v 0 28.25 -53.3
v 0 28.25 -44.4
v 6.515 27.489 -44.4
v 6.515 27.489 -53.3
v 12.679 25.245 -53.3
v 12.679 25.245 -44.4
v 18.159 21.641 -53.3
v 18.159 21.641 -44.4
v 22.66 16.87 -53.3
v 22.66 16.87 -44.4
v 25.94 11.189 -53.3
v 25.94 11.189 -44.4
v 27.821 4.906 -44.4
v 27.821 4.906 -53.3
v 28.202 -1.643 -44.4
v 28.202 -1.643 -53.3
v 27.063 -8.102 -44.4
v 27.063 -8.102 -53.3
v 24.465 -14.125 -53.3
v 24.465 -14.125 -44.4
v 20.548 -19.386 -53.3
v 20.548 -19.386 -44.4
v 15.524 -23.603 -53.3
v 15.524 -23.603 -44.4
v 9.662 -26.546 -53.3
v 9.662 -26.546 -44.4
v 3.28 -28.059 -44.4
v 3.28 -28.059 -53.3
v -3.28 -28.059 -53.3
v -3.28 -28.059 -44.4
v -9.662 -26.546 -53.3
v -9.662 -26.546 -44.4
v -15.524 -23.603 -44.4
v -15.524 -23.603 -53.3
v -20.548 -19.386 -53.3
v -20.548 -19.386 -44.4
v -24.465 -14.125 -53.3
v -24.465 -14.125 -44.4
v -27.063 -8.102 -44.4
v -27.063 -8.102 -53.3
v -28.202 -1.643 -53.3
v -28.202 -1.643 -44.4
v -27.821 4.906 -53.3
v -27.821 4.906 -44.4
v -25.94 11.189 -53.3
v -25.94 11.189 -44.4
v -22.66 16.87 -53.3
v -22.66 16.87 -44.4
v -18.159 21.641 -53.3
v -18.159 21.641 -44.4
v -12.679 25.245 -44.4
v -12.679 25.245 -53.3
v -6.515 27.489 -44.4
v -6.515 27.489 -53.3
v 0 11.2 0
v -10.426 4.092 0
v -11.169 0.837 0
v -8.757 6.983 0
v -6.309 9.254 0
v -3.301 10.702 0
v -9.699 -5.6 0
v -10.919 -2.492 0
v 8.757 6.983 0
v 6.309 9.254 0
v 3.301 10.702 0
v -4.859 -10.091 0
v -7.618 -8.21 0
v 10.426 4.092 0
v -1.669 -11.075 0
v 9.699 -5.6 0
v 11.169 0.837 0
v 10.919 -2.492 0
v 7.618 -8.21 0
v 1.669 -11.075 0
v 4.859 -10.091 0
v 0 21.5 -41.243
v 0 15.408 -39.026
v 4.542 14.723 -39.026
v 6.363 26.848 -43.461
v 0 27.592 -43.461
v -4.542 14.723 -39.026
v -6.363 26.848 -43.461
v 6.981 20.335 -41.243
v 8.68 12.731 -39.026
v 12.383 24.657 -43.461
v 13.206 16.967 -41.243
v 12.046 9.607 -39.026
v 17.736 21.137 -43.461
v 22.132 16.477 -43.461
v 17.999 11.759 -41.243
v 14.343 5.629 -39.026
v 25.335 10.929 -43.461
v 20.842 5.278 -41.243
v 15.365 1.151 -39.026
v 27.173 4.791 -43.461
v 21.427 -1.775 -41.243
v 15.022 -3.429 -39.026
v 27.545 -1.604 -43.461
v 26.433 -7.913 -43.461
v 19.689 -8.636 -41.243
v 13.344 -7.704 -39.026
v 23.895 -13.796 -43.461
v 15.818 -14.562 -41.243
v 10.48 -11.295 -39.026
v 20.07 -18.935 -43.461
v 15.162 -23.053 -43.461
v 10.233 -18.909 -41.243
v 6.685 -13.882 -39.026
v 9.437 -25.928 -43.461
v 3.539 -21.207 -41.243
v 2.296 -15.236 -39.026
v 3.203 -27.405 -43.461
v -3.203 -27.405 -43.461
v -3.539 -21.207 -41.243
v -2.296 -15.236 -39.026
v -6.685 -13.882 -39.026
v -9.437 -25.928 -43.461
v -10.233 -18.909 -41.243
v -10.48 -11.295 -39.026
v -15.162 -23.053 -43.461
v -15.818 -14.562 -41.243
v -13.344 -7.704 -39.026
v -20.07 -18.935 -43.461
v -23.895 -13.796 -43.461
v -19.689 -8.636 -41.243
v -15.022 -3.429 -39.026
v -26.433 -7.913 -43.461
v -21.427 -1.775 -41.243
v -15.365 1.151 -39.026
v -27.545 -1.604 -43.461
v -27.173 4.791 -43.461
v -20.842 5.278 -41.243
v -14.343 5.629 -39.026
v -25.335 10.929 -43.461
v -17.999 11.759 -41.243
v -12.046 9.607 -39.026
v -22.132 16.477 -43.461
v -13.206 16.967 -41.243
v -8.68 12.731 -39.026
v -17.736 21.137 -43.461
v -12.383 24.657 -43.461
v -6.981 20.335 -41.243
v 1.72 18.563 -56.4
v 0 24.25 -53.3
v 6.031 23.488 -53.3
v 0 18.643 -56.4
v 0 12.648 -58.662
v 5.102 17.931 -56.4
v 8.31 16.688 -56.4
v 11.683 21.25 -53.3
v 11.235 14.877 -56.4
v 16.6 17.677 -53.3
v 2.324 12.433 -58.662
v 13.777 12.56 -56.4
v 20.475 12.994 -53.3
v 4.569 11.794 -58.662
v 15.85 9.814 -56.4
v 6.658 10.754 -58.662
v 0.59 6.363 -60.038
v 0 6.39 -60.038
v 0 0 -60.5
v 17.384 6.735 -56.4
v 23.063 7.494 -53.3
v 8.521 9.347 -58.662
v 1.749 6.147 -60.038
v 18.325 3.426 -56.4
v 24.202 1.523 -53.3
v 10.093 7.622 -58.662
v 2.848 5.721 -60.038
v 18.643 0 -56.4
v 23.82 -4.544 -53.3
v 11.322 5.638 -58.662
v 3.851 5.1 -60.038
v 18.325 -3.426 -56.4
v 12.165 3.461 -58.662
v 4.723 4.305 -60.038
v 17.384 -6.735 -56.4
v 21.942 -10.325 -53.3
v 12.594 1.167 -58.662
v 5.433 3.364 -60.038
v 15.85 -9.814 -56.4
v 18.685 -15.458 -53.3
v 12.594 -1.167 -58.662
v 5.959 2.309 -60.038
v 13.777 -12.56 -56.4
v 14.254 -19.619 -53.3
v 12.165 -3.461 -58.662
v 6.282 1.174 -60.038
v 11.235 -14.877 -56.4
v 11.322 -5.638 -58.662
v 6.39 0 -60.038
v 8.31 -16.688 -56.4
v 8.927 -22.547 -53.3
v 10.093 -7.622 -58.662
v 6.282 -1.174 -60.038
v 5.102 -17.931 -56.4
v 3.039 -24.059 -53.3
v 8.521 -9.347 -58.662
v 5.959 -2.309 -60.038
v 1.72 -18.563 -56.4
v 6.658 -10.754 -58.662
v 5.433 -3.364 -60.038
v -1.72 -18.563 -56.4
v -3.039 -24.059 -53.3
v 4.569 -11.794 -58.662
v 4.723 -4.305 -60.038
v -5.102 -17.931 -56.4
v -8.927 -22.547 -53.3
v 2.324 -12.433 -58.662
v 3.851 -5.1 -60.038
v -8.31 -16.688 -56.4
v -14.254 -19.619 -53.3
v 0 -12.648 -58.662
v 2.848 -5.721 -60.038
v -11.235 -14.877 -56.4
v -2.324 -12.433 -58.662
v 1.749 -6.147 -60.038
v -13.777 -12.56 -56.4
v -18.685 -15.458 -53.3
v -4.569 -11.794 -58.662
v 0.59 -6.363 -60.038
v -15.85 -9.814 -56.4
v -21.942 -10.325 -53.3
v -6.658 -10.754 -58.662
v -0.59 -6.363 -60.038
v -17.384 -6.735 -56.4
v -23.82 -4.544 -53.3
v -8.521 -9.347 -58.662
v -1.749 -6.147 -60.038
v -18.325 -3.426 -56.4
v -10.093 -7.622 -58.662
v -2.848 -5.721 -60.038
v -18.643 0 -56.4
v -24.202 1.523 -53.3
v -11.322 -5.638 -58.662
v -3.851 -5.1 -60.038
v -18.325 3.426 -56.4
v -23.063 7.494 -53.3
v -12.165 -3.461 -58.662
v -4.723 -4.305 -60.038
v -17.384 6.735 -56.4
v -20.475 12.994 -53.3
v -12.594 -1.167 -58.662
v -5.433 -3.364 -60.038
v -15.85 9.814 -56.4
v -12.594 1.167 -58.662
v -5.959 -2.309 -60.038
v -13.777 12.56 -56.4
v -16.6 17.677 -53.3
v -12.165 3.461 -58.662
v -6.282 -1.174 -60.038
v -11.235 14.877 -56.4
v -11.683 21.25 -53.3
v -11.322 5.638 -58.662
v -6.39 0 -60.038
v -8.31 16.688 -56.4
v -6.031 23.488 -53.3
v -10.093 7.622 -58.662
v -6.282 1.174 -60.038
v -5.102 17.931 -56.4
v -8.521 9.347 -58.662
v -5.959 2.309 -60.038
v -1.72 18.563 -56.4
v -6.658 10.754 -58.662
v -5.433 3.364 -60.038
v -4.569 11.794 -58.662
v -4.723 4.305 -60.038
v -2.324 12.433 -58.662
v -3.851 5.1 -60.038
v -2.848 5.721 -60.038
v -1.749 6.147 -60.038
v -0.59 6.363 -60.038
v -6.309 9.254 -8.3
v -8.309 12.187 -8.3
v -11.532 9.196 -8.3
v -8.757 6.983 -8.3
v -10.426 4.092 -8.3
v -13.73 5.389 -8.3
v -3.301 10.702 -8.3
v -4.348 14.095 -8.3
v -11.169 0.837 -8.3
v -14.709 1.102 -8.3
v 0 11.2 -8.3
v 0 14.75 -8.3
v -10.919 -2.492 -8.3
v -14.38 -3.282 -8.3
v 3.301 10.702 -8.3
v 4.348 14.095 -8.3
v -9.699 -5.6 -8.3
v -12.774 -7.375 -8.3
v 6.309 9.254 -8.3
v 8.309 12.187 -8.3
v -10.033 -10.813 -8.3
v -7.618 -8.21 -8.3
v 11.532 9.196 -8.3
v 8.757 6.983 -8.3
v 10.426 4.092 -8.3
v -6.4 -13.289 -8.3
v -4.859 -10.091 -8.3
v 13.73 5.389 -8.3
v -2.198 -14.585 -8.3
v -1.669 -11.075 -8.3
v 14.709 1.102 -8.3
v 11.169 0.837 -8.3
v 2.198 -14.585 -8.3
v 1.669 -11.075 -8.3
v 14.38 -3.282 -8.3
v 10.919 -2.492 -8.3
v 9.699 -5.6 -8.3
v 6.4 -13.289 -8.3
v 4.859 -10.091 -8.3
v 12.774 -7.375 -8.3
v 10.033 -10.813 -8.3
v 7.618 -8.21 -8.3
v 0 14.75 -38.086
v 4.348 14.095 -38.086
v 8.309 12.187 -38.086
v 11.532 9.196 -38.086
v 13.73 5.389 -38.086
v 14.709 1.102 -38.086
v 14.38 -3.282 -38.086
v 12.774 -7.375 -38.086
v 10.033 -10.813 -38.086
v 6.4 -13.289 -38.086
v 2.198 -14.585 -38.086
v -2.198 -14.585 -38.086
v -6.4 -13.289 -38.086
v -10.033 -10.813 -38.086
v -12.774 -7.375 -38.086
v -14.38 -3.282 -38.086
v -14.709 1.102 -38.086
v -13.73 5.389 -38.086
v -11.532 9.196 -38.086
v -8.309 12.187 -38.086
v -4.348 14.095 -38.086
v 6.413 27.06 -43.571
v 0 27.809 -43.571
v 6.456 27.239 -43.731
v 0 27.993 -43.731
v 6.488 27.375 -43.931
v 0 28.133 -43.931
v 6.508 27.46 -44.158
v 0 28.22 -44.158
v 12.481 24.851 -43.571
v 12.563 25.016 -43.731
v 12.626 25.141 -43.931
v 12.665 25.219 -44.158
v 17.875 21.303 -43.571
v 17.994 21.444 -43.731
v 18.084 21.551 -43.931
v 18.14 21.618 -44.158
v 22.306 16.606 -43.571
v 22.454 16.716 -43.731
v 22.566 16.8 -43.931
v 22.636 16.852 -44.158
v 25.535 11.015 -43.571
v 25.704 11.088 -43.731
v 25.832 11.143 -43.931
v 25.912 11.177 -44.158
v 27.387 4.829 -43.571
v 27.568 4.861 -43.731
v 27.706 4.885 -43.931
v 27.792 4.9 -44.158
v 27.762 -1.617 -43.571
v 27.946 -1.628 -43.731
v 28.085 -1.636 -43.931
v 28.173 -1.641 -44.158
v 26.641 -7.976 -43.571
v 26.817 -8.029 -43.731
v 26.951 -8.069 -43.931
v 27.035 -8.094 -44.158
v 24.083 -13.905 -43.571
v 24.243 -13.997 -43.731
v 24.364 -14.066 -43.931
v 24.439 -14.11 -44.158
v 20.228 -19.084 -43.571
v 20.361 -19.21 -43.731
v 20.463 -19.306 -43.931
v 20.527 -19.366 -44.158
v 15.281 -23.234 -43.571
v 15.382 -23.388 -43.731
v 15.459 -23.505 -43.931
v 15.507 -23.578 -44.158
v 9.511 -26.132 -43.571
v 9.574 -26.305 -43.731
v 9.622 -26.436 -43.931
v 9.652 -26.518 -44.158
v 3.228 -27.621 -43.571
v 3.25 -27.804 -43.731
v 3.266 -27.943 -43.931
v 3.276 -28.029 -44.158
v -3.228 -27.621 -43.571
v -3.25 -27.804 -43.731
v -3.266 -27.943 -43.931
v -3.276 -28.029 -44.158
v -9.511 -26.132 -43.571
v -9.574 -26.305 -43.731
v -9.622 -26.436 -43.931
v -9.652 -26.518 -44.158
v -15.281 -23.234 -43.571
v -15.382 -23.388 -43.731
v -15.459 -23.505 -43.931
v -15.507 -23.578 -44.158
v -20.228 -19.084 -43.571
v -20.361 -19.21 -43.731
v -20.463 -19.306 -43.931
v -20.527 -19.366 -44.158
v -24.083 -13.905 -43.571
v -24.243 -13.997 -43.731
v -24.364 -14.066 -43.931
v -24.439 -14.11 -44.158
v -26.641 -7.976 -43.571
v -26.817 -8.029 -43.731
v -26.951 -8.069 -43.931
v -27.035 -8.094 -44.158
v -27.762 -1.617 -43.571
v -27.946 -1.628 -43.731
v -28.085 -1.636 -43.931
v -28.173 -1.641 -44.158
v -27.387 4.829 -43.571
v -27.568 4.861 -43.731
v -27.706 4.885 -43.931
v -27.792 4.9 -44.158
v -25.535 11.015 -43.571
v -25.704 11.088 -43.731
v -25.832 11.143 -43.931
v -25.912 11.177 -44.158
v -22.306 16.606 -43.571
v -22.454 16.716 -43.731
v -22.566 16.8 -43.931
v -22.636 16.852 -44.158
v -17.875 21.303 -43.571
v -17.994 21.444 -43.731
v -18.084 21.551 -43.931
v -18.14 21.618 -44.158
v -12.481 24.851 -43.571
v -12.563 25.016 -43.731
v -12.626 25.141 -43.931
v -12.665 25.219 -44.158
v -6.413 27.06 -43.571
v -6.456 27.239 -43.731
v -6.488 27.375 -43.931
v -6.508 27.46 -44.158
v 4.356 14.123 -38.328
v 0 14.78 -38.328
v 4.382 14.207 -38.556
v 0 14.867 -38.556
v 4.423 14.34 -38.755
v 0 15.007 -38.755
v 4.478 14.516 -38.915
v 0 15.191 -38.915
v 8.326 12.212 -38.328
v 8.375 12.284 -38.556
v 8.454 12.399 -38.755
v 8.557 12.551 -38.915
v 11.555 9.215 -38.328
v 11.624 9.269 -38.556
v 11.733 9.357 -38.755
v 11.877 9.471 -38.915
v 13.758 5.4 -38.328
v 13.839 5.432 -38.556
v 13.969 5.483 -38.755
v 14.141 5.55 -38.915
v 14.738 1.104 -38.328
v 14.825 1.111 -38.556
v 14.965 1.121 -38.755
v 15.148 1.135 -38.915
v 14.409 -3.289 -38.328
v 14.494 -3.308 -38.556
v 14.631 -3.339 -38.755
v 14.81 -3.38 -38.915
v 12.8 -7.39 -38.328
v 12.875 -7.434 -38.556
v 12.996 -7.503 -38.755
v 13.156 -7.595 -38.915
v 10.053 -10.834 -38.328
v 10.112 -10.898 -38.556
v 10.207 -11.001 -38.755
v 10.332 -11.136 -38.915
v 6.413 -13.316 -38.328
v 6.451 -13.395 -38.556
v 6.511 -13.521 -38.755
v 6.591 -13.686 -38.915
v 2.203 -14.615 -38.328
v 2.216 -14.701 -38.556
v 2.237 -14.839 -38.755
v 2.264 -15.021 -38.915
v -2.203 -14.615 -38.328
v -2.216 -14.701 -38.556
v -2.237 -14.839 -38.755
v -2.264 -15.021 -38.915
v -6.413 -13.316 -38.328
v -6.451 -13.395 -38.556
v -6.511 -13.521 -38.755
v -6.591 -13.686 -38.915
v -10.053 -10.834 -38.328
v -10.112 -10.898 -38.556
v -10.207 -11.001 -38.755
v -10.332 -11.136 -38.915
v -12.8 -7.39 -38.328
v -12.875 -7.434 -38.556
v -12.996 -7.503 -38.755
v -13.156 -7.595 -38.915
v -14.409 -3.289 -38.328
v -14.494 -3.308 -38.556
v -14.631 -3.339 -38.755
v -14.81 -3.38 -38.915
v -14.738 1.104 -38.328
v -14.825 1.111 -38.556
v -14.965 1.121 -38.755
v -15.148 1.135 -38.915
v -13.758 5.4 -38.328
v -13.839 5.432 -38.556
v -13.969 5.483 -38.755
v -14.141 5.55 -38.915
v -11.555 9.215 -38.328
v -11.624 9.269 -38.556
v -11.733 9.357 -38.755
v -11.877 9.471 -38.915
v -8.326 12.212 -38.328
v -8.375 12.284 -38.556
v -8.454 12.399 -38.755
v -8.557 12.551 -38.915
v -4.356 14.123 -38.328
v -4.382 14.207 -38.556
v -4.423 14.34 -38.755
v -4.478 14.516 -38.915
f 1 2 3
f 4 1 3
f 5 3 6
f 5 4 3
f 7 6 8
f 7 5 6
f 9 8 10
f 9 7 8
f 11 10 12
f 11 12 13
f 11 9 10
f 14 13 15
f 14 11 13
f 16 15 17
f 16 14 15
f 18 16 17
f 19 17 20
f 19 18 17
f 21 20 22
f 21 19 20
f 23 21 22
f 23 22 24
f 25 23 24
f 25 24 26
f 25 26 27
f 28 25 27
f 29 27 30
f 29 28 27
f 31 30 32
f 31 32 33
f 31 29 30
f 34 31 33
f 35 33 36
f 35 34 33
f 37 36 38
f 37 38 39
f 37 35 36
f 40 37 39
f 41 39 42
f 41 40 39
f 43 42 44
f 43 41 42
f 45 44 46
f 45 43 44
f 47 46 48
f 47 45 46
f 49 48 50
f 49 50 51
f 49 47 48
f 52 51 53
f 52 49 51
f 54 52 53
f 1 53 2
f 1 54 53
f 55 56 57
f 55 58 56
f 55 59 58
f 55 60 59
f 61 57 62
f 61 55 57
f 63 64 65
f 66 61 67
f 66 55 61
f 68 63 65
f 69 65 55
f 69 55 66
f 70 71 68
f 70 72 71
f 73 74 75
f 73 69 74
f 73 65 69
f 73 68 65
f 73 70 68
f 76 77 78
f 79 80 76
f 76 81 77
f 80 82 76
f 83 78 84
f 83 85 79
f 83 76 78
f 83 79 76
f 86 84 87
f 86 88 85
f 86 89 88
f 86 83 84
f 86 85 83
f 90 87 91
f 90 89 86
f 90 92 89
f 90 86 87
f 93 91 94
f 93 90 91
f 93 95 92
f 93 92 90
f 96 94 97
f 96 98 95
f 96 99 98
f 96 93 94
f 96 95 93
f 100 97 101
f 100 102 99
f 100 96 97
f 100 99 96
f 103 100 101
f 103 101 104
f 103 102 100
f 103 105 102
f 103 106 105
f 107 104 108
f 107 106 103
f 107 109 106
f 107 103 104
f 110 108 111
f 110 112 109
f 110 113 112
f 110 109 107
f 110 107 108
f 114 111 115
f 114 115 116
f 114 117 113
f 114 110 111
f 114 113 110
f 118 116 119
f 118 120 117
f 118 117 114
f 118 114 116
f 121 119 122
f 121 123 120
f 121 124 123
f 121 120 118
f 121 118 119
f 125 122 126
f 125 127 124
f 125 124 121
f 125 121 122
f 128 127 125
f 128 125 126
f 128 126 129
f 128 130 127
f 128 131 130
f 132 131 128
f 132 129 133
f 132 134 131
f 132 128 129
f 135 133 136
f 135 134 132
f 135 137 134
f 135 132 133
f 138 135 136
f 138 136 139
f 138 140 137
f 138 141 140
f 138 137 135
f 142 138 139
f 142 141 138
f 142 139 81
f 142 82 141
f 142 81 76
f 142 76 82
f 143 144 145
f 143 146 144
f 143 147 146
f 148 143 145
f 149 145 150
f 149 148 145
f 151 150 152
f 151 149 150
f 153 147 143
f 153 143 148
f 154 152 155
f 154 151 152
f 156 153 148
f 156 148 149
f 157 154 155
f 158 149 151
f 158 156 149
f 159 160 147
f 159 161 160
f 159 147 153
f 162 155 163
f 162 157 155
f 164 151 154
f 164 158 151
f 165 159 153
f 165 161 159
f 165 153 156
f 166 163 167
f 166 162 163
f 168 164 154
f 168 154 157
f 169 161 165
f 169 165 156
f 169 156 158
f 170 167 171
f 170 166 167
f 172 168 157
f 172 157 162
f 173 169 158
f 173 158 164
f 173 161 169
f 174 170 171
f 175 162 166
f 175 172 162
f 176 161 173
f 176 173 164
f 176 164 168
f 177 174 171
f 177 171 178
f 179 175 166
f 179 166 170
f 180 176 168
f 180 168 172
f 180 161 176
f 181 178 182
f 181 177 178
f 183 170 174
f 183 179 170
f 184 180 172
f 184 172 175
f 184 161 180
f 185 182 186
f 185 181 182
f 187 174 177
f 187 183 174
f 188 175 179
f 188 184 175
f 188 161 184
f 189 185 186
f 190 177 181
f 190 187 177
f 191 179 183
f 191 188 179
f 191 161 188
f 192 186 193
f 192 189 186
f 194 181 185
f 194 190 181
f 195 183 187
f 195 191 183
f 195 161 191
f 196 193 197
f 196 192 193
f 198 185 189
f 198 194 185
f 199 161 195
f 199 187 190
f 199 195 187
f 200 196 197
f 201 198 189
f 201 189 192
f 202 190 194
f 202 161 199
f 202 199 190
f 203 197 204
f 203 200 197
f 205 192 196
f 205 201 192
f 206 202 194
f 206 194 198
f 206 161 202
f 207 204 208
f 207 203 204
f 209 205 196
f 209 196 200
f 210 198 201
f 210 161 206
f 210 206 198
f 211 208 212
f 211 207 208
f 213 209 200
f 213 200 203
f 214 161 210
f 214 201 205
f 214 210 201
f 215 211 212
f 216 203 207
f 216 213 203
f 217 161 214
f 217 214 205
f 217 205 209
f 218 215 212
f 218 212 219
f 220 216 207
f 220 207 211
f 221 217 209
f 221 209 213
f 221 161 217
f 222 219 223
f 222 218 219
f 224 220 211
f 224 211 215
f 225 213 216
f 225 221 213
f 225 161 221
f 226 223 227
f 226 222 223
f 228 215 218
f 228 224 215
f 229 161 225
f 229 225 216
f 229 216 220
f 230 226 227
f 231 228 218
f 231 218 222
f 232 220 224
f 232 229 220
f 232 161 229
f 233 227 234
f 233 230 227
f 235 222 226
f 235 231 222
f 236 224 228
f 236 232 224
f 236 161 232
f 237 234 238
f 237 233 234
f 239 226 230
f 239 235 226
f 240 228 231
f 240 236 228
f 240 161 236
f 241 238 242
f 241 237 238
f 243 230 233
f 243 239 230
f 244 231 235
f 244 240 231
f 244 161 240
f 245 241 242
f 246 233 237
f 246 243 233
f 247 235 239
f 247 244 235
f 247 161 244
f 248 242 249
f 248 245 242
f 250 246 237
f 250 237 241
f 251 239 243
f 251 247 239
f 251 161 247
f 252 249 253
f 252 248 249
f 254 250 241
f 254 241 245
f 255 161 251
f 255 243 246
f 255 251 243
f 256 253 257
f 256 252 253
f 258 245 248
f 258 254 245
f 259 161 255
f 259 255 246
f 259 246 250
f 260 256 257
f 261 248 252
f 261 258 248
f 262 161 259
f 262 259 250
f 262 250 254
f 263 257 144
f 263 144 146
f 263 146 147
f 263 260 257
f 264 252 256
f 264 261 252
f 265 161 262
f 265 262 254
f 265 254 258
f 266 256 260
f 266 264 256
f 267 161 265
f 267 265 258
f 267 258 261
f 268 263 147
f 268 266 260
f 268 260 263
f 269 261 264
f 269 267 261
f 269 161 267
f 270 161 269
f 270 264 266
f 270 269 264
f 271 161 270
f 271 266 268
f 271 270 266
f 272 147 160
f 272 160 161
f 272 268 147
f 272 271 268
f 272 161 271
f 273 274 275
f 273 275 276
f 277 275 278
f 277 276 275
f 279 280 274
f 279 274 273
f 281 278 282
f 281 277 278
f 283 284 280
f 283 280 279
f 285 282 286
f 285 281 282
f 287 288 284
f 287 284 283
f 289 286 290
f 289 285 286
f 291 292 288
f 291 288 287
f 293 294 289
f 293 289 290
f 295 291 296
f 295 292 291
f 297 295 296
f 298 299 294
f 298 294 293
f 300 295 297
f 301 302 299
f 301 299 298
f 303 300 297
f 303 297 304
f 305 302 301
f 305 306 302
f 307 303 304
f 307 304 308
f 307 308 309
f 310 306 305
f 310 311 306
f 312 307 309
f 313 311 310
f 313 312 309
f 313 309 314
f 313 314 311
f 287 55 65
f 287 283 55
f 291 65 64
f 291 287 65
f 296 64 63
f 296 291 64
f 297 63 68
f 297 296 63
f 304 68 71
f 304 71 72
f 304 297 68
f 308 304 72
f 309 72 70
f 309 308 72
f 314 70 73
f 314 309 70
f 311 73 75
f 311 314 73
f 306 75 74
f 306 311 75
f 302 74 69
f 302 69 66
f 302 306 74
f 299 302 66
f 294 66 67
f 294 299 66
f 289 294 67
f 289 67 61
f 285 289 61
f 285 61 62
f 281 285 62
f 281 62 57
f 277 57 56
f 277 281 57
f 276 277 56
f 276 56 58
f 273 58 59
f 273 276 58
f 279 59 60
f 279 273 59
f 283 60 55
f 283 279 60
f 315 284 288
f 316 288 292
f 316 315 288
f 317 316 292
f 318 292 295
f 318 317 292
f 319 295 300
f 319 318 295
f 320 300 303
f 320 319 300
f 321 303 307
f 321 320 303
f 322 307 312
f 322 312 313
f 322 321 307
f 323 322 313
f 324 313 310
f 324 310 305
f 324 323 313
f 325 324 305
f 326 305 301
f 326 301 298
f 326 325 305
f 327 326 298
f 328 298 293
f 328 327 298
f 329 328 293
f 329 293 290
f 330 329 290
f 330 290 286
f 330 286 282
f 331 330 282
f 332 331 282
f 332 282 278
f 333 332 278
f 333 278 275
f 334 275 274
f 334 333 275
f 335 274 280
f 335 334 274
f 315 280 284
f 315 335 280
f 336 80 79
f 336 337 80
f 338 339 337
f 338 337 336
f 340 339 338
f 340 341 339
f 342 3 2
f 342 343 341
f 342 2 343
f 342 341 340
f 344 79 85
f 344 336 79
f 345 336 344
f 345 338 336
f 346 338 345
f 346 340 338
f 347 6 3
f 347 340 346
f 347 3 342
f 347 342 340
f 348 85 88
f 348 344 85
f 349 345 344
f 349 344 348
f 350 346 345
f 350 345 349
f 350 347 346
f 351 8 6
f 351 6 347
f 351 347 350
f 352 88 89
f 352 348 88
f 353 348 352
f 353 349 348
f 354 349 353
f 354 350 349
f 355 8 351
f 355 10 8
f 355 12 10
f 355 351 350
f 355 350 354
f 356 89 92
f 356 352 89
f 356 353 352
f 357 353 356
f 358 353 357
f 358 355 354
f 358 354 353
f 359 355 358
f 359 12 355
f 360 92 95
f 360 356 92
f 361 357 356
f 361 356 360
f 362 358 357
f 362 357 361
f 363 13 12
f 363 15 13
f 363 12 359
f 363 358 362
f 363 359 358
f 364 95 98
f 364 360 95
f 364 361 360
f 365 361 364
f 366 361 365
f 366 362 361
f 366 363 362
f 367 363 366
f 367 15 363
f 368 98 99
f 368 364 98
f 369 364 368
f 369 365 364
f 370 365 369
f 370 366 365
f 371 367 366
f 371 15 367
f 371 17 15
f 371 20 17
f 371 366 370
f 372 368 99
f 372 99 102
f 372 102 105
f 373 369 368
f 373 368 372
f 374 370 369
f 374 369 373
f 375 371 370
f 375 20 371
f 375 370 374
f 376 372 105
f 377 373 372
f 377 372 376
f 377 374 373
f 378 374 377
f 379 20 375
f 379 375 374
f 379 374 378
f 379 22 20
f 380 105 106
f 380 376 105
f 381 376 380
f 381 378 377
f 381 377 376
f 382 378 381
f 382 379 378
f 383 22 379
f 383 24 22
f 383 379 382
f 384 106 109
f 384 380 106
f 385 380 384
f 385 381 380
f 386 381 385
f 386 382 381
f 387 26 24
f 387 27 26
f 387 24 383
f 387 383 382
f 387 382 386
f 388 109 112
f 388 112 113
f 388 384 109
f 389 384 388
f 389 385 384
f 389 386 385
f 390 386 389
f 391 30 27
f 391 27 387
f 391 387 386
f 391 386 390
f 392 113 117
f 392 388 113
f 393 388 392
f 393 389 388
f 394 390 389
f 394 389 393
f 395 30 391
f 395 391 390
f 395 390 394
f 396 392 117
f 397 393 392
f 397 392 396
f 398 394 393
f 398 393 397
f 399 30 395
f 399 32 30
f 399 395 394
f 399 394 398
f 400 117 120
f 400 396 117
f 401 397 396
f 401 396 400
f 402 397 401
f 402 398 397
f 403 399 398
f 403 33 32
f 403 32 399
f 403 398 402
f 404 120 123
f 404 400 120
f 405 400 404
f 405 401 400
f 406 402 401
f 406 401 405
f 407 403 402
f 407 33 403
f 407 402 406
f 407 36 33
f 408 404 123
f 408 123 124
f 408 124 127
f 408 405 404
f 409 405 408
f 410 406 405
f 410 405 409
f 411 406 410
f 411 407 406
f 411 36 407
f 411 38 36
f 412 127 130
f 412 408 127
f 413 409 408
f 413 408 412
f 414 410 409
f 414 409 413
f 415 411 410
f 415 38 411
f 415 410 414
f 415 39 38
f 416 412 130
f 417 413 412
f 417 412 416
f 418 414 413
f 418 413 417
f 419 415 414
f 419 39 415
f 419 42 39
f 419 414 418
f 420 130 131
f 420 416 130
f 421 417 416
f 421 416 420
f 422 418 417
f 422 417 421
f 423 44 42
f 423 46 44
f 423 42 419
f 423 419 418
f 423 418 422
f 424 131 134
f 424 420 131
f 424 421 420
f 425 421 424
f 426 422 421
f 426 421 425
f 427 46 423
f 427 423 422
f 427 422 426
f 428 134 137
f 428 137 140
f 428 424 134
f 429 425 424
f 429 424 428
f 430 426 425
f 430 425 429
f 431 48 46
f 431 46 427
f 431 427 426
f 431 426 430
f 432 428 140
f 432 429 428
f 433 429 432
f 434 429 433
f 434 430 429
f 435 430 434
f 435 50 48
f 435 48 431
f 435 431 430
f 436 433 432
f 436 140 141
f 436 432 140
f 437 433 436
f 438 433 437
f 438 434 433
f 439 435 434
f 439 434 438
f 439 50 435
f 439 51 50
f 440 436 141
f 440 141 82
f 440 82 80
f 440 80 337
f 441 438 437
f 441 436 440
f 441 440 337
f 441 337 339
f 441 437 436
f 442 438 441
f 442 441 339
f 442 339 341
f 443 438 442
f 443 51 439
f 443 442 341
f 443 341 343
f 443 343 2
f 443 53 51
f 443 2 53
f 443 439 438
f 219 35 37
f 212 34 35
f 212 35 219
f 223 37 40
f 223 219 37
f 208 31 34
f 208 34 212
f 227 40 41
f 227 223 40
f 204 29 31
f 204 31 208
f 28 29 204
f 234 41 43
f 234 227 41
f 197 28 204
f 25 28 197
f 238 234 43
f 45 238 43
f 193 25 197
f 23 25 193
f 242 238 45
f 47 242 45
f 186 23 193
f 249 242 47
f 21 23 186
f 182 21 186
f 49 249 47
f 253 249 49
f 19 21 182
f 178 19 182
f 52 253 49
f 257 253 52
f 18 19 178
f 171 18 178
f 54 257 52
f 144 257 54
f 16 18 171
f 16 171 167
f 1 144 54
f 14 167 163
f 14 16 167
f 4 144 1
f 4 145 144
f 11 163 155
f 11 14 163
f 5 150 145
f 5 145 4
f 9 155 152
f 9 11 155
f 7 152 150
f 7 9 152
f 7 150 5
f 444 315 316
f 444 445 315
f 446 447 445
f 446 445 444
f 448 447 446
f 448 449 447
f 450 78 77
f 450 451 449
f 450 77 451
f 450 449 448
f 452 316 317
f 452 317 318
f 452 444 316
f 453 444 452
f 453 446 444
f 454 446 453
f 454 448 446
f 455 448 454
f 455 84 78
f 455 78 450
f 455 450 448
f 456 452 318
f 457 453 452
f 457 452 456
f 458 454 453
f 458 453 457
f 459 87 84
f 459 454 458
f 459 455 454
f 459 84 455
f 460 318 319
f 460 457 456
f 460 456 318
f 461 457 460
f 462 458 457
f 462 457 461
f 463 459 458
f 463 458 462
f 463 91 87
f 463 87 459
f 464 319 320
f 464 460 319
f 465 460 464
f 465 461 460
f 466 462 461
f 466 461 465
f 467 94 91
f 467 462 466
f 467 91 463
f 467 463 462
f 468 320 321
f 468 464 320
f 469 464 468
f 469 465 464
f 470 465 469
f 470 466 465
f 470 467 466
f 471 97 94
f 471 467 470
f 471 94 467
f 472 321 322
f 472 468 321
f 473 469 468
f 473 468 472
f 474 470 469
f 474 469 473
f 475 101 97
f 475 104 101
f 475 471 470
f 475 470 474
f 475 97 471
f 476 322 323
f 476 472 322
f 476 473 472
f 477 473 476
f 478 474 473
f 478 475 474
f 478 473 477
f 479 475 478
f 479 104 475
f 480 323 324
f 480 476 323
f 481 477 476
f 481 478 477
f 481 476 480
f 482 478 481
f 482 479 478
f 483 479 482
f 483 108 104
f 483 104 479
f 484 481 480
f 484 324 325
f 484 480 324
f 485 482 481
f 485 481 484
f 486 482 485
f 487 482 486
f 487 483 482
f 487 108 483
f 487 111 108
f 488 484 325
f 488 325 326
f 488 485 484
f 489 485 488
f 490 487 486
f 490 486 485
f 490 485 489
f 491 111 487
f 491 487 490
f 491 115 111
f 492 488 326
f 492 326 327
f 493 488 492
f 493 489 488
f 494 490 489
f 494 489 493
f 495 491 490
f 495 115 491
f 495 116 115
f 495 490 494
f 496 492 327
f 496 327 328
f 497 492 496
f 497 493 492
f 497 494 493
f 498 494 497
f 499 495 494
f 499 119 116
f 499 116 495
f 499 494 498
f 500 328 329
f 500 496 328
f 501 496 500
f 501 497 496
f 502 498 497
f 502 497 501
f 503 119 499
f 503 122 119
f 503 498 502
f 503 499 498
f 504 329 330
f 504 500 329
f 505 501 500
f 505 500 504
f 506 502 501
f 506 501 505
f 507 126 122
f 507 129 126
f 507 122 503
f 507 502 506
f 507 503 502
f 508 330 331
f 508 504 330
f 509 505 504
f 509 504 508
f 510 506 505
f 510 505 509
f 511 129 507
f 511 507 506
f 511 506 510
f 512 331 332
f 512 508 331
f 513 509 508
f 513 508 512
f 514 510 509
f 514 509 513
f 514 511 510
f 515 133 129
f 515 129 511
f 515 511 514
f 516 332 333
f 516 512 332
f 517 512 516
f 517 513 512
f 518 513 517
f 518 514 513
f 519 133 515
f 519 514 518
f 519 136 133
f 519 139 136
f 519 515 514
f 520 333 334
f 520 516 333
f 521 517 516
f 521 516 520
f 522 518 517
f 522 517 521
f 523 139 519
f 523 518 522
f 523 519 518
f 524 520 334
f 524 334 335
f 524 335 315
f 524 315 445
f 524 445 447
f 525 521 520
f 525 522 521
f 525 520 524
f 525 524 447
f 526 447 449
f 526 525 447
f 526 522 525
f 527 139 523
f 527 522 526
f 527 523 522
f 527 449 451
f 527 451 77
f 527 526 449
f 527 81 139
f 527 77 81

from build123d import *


with BuildPart() as part:
    # Sketch1 → Revolve1 (revolve)
    with BuildSketch(Plane(origin=(0, 0, 0), x_dir=(0, 0, -1), z_dir=(1, 0, 0))):
        with BuildLine():
            Line((39.02588692, 15.407979857), (43.460514917, 27.592020143))
            ThreePointArc((43.460514917, 27.592020143), (43.826631102, 28.069152044), (44.400207538, 28.25))
            Line((44.400207538, 28.25), (53.3, 28.25))
            Line((53.3, 28.25), (53.3, 24.25))
            ThreePointArc((53.3, 24.25), (58.661988488, 12.648147098), (60.5, 0))
            Line((60.5, 0), (0, 0))
            Line((0, 0), (0, 11.2))
            Line((0, 11.2), (8.3, 11.2))
            Line((8.3, 11.2), (8.3, 14.75))
            Line((8.3, 14.75), (38.086194299, 14.75))
            ThreePointArc((38.086194299, 14.75), (38.659770736, 14.930847956), (39.02588692, 15.407979857))
        make_face()
    revolve(axis=Axis((0, 0, 0), (0, 0, -1)))


solid = part.part
